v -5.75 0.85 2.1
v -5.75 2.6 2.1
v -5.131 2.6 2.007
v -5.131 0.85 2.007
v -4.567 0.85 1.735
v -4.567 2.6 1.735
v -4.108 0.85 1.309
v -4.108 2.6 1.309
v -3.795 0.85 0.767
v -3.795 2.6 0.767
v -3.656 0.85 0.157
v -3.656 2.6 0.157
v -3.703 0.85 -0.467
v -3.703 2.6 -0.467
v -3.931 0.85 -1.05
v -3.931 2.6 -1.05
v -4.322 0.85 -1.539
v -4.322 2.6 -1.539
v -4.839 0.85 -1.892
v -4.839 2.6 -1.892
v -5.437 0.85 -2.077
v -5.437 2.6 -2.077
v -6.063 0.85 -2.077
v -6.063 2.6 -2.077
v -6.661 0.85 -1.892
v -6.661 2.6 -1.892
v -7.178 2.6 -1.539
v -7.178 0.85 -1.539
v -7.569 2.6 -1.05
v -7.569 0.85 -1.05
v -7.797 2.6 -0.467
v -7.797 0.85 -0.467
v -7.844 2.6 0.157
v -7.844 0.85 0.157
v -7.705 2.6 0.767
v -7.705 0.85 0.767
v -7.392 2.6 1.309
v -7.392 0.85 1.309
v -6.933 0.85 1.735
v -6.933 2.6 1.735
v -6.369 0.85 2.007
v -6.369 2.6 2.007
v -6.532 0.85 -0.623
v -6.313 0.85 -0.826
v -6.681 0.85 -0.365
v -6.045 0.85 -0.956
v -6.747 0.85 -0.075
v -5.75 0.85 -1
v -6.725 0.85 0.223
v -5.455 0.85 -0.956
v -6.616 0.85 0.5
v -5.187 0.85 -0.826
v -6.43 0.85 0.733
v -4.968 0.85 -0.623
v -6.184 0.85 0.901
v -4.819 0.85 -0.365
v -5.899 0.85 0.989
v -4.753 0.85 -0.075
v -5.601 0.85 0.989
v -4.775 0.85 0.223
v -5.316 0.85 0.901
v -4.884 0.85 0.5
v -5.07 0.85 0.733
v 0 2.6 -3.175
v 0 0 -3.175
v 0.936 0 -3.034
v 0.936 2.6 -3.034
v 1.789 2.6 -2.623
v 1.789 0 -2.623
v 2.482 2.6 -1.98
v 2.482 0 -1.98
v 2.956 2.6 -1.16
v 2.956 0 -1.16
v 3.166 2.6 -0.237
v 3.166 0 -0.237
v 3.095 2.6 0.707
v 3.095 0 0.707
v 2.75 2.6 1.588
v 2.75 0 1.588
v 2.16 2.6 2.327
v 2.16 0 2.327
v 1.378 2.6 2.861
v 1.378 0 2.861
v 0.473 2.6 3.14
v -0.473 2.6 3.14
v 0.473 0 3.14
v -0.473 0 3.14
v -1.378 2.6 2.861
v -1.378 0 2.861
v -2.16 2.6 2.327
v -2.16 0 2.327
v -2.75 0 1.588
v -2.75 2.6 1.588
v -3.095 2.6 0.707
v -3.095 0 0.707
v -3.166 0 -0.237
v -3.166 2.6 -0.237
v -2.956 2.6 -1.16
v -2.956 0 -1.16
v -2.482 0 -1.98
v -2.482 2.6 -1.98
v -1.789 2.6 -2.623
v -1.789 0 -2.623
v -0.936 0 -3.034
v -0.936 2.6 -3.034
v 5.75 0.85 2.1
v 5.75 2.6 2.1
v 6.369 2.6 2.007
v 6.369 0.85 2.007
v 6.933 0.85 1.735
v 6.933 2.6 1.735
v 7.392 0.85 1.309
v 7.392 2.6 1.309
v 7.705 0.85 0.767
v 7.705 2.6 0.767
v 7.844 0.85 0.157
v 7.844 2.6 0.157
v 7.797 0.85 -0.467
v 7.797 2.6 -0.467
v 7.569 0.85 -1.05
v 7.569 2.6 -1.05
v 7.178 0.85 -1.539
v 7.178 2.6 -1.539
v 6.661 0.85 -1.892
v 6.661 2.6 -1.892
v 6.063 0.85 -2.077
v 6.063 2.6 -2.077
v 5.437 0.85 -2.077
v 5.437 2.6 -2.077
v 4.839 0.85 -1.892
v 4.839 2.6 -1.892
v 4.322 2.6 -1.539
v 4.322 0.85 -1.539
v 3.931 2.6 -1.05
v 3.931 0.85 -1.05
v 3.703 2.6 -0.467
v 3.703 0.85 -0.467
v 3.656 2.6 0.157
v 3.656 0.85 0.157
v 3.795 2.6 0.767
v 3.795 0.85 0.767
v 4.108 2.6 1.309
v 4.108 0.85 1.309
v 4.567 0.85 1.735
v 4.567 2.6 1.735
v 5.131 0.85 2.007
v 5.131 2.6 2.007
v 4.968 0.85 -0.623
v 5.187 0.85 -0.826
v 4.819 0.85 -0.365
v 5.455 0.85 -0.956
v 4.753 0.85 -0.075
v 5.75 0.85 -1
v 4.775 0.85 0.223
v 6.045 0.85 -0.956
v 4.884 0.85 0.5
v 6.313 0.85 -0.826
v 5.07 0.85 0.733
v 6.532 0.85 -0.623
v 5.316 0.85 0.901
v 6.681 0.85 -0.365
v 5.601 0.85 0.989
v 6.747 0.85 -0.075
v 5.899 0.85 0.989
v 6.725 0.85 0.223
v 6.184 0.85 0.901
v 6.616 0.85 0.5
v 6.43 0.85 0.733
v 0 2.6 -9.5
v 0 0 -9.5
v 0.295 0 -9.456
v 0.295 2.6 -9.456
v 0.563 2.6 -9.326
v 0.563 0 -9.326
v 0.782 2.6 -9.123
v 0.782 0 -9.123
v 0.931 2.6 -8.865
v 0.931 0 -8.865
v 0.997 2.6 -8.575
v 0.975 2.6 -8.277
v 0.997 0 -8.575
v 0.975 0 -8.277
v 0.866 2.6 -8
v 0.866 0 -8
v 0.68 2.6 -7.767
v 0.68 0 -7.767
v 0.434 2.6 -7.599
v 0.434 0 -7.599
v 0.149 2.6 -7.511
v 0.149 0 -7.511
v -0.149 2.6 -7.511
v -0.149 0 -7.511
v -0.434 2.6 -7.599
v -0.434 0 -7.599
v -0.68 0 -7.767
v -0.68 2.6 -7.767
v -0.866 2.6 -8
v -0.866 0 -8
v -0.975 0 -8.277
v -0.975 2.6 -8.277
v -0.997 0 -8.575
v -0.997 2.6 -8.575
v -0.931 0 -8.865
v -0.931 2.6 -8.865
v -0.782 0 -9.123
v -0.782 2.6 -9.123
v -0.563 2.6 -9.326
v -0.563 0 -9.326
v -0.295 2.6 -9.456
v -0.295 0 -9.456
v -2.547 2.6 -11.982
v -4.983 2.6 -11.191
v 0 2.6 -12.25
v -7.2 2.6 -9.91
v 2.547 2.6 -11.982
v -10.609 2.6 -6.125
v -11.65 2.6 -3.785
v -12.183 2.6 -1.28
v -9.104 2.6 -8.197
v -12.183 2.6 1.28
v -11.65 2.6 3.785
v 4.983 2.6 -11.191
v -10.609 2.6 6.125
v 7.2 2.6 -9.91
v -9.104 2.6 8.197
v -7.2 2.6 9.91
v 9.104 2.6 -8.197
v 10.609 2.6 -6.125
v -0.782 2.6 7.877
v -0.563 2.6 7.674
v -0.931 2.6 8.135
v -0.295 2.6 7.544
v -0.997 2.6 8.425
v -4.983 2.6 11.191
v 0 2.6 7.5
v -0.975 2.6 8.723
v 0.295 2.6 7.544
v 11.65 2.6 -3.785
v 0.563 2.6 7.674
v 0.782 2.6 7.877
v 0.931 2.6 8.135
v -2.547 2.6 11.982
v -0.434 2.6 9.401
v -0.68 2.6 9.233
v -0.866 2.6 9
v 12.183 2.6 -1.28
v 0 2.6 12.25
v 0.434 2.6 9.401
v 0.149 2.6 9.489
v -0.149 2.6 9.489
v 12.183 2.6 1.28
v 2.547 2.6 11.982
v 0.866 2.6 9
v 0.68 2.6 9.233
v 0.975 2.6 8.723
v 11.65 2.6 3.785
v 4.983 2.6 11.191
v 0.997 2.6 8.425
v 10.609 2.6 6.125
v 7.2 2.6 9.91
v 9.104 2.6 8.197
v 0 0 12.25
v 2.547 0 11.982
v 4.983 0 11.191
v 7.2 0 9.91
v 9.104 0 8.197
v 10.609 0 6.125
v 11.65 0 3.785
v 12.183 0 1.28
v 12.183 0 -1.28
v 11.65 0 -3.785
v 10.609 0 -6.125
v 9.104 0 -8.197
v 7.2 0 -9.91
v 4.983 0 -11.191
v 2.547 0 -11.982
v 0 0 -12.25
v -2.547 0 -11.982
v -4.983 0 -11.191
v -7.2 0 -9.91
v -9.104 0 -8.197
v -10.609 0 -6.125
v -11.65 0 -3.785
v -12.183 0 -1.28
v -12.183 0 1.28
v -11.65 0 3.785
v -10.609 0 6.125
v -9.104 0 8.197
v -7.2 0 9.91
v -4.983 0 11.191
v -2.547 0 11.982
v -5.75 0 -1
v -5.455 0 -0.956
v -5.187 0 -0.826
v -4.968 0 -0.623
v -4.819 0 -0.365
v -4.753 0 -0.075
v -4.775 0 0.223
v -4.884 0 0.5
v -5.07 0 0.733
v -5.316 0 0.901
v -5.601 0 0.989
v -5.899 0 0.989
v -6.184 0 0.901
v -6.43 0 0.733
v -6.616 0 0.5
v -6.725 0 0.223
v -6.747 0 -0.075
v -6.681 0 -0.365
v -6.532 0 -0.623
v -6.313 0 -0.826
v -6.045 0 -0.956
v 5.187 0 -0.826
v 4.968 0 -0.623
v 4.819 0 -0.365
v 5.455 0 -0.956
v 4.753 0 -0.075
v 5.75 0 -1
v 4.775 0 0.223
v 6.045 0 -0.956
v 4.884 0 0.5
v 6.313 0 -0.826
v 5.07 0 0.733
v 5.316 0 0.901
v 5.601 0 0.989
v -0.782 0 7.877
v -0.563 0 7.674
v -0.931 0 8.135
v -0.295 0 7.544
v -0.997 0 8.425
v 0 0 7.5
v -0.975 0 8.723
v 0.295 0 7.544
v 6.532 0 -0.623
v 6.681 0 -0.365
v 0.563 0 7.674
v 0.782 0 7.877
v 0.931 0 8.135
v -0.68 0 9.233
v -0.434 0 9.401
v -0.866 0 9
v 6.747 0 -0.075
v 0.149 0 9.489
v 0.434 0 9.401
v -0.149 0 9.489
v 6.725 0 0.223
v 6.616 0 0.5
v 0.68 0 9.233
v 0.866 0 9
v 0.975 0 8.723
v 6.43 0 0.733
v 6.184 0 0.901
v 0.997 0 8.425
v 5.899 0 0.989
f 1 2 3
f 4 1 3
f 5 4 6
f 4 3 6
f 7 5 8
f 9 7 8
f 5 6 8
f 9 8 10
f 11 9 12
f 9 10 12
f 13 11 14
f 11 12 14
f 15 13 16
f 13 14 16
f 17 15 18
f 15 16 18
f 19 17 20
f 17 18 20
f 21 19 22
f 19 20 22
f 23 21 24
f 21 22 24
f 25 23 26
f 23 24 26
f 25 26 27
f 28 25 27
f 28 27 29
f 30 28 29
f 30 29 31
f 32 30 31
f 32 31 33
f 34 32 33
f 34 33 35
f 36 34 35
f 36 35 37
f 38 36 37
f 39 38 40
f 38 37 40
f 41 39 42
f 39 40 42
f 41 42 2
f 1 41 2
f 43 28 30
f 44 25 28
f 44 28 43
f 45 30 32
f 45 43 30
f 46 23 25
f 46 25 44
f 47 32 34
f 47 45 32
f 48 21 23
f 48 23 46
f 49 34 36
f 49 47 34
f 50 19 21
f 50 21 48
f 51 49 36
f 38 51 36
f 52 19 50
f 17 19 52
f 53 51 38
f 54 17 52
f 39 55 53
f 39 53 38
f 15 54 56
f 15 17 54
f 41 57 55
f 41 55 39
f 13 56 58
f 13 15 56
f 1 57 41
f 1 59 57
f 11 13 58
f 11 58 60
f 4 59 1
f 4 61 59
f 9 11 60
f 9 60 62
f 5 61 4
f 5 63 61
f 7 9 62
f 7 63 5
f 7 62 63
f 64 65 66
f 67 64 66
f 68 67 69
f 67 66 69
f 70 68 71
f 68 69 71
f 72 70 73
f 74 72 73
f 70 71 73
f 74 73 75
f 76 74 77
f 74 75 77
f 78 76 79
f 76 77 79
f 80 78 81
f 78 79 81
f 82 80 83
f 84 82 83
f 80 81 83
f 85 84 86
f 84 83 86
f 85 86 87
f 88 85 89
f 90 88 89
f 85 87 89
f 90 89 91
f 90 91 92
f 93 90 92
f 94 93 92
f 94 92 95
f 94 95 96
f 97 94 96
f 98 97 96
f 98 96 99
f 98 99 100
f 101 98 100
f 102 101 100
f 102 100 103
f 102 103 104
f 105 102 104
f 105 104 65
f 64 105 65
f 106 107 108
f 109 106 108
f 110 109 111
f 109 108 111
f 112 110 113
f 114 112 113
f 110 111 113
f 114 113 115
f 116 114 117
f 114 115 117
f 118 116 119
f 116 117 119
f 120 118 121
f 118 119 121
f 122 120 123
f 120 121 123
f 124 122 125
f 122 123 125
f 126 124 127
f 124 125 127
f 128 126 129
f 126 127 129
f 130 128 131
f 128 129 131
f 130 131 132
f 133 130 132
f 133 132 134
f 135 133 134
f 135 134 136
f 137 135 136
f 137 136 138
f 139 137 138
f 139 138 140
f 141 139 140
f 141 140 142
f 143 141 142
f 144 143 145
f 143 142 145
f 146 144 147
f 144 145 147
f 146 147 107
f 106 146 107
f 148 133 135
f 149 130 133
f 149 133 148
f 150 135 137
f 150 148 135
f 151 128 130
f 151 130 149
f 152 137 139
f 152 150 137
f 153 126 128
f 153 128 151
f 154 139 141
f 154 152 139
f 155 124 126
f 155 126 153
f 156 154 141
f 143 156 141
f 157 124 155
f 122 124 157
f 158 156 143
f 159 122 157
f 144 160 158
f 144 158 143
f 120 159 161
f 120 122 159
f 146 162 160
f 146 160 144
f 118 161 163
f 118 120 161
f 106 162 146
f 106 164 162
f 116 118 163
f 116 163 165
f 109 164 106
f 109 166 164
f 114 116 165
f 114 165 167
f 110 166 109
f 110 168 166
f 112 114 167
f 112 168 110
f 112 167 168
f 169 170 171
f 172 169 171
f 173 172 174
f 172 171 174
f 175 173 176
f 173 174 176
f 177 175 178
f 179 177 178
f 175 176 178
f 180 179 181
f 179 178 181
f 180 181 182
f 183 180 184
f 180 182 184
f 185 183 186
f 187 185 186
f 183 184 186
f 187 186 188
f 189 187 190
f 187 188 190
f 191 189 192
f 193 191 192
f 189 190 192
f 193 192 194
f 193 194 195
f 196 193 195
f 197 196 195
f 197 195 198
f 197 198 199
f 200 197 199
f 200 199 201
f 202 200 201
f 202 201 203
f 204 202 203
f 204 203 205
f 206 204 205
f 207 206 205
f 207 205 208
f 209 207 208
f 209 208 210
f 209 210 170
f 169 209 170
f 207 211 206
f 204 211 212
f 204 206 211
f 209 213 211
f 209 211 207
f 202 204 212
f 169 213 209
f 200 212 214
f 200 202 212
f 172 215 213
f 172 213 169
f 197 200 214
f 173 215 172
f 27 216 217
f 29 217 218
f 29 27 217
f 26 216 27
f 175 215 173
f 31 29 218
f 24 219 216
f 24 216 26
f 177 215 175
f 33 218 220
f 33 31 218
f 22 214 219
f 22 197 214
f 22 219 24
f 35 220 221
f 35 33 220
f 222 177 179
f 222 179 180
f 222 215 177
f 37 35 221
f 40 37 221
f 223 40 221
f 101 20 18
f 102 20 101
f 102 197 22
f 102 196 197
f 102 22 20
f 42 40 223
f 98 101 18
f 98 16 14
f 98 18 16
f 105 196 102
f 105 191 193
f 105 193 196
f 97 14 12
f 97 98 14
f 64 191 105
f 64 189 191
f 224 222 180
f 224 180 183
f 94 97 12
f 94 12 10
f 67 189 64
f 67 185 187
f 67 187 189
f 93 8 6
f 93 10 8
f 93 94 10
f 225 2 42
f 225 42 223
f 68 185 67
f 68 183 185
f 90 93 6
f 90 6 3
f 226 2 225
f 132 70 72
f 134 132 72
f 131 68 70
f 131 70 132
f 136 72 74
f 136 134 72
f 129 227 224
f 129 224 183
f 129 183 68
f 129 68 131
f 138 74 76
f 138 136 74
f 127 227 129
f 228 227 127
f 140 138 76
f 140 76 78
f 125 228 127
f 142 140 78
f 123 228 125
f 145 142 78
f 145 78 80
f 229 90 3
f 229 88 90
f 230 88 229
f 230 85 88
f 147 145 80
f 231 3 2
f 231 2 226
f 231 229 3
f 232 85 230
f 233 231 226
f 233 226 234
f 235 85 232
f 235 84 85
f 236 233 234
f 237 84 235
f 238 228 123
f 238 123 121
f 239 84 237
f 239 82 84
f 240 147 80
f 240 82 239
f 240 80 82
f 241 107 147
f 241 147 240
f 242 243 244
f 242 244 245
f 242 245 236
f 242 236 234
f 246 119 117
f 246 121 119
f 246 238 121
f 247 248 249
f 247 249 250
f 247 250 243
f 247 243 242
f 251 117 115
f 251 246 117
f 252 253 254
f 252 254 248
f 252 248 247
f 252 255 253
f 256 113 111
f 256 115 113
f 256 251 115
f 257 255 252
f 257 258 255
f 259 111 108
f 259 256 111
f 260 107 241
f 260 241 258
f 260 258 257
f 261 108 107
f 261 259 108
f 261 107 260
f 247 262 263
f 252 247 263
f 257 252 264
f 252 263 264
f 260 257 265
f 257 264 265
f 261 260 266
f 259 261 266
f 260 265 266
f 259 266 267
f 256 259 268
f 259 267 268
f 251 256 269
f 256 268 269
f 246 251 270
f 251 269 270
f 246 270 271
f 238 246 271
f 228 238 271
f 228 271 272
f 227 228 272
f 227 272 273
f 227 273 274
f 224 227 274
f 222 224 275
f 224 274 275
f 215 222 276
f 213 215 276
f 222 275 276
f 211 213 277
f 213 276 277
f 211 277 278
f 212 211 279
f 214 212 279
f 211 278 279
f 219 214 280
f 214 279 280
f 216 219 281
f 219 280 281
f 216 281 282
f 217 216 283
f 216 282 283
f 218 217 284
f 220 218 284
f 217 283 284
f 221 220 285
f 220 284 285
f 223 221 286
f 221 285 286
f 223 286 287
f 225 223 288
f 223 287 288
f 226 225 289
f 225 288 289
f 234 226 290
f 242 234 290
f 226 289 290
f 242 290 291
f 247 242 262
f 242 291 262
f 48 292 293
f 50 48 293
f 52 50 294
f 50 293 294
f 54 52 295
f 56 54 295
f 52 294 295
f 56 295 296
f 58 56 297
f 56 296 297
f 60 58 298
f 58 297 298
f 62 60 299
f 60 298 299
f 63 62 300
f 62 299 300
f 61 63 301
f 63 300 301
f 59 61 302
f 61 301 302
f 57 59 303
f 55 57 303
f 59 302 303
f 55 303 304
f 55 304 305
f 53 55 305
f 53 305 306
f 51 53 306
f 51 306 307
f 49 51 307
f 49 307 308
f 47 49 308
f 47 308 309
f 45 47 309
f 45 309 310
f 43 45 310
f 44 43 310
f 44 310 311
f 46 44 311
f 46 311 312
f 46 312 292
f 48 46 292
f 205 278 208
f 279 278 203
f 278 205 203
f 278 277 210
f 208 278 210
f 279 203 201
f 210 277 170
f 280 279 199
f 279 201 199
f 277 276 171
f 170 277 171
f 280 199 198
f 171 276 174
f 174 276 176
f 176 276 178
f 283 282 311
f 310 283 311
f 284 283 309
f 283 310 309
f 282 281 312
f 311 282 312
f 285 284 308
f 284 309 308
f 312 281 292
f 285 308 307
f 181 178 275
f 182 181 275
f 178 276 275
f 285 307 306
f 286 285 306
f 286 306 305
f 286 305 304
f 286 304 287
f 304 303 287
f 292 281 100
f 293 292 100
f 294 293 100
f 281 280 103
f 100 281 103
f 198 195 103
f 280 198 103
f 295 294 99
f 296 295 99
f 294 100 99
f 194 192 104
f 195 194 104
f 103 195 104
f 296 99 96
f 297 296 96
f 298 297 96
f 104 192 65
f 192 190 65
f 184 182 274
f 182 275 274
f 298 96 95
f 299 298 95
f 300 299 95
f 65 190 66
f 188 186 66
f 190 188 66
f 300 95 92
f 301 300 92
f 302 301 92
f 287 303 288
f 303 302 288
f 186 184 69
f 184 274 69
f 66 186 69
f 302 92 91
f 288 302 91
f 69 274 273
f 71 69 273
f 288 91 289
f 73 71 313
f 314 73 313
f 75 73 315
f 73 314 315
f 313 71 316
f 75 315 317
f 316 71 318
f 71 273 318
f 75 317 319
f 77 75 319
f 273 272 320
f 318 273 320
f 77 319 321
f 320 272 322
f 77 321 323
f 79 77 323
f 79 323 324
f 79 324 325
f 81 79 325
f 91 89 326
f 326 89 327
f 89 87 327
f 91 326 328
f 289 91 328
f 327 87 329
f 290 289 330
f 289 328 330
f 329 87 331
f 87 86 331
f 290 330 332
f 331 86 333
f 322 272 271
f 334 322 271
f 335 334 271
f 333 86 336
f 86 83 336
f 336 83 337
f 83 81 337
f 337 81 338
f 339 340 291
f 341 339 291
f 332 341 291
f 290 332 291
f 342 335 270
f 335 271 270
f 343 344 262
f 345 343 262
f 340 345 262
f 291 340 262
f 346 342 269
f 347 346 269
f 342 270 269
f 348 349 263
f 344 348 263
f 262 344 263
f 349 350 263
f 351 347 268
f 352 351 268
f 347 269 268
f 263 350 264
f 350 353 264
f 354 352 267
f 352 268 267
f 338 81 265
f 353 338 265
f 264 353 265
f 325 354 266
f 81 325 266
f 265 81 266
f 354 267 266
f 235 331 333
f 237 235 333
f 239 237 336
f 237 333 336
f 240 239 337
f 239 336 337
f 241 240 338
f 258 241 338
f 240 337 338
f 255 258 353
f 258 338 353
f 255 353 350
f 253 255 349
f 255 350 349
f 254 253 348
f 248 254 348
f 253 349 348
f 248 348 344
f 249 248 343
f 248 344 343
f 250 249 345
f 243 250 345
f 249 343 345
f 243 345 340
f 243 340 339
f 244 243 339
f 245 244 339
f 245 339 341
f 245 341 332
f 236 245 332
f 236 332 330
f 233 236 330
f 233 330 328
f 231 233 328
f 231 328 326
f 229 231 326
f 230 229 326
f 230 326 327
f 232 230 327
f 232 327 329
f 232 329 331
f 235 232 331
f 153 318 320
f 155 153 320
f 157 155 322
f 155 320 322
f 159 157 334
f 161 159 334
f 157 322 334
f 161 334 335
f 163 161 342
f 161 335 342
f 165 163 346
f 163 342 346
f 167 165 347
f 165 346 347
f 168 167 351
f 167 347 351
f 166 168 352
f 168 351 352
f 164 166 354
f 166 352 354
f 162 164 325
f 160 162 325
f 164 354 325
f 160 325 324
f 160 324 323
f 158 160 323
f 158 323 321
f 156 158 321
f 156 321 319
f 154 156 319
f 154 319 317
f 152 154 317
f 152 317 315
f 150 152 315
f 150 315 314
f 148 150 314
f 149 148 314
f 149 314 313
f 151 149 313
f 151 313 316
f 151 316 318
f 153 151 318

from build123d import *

# Parameters (mm, degrees)
SKETCH1_R           = 12.25
BOSS_EXTRUDE1_DEPTH = 2.6
CUT_EXTRUDE1_REACH  = 19.518
SKETCH2_R           = 3.175
SKETCH2_R_2         = 1
SKETCH3_R           = 2.1
CUT_EXTRUDE2_DEPTH  = 1.75


with BuildPart() as part:
    # Sketch1 → Boss-Extrude1 (new body)
    with BuildSketch(Plane(origin=(0, 0, 0), x_dir=(1, 0, 0), z_dir=(0, 1, 0))):
        with Locations(Location((0, 0, 0), (0, 0, 270))):
            Circle(SKETCH1_R)
    extrude(amount=BOSS_EXTRUDE1_DEPTH)

    # Sketch2 → Cut-Extrude1 (cut, up to next)
    with BuildSketch(Plane.XZ, mode=Mode.PRIVATE) as cut_extrude1_sk1:
        with Locations(Location((0, 0, 0), (0, 0, 270))):
            Circle(SKETCH2_R)
    cut_extrude1_tool1 = extrude(cut_extrude1_sk1.sketch, amount=-CUT_EXTRUDE1_REACH, mode=Mode.PRIVATE) & part.part
    # Sketch2 → Cut-Extrude1 (cut, up to next)
    with BuildSketch(Plane.XZ, mode=Mode.PRIVATE) as cut_extrude1_sk2:
        with Locations(Location((0, 8.5, 0), (0, 0, 270))):
            Circle(SKETCH2_R_2)
    cut_extrude1_tool2 = extrude(cut_extrude1_sk2.sketch, amount=-CUT_EXTRUDE1_REACH, mode=Mode.PRIVATE) & part.part
    # Sketch2 → Cut-Extrude1 (cut, up to next)
    with BuildSketch(Plane.XZ, mode=Mode.PRIVATE) as cut_extrude1_sk3:
        with Locations(Location((0, -8.5, 0), (0, 0, 270))):
            Circle(SKETCH2_R_2)
    cut_extrude1_tool3 = extrude(cut_extrude1_sk3.sketch, amount=-CUT_EXTRUDE1_REACH, mode=Mode.PRIVATE) & part.part
    # Sketch2 → Cut-Extrude1 (cut, up to next)
    with BuildSketch(Plane.XZ, mode=Mode.PRIVATE) as cut_extrude1_sk4:
        with Locations(Location((-5.75, 0, 0), (0, 0, 270))):
            Circle(SKETCH2_R_2)
    cut_extrude1_tool4 = extrude(cut_extrude1_sk4.sketch, amount=-CUT_EXTRUDE1_REACH, mode=Mode.PRIVATE) & part.part
    # Sketch2 → Cut-Extrude1 (cut, up to next)
    with BuildSketch(Plane.XZ, mode=Mode.PRIVATE) as cut_extrude1_sk5:
        with Locations(Location((5.75, 0, 0), (0, 0, 270))):
            Circle(SKETCH2_R_2)
    cut_extrude1_tool5 = extrude(cut_extrude1_sk5.sketch, amount=-CUT_EXTRUDE1_REACH, mode=Mode.PRIVATE) & part.part
    add(cut_extrude1_tool1.solids().sort_by_distance((0, 0, 0))[0], mode=Mode.SUBTRACT)
    add(cut_extrude1_tool2.solids().sort_by_distance((0, 0, 8.5))[0], mode=Mode.SUBTRACT)
    add(cut_extrude1_tool3.solids().sort_by_distance((0, 0, -8.5))[0], mode=Mode.SUBTRACT)
    add(cut_extrude1_tool4.solids().sort_by_distance((-5.75, 0, 0))[0], mode=Mode.SUBTRACT)
    add(cut_extrude1_tool5.solids().sort_by_distance((5.75, 0, 0))[0], mode=Mode.SUBTRACT)

    # Sketch3 → Cut-Extrude2 (cut)
    with BuildSketch(Plane(origin=(0, 2.6, 0), x_dir=(1, 0, 0), z_dir=(0, 1, 0))):
        with Locations(Location((-5.75, 0, 0), (0, 0, 270))):
            Circle(SKETCH3_R)
        with Locations(Location((5.75, 0, 0), (0, 0, 270))):
            Circle(SKETCH3_R)
    extrude(amount=-CUT_EXTRUDE2_DEPTH, mode=Mode.SUBTRACT)


solid = part.part
